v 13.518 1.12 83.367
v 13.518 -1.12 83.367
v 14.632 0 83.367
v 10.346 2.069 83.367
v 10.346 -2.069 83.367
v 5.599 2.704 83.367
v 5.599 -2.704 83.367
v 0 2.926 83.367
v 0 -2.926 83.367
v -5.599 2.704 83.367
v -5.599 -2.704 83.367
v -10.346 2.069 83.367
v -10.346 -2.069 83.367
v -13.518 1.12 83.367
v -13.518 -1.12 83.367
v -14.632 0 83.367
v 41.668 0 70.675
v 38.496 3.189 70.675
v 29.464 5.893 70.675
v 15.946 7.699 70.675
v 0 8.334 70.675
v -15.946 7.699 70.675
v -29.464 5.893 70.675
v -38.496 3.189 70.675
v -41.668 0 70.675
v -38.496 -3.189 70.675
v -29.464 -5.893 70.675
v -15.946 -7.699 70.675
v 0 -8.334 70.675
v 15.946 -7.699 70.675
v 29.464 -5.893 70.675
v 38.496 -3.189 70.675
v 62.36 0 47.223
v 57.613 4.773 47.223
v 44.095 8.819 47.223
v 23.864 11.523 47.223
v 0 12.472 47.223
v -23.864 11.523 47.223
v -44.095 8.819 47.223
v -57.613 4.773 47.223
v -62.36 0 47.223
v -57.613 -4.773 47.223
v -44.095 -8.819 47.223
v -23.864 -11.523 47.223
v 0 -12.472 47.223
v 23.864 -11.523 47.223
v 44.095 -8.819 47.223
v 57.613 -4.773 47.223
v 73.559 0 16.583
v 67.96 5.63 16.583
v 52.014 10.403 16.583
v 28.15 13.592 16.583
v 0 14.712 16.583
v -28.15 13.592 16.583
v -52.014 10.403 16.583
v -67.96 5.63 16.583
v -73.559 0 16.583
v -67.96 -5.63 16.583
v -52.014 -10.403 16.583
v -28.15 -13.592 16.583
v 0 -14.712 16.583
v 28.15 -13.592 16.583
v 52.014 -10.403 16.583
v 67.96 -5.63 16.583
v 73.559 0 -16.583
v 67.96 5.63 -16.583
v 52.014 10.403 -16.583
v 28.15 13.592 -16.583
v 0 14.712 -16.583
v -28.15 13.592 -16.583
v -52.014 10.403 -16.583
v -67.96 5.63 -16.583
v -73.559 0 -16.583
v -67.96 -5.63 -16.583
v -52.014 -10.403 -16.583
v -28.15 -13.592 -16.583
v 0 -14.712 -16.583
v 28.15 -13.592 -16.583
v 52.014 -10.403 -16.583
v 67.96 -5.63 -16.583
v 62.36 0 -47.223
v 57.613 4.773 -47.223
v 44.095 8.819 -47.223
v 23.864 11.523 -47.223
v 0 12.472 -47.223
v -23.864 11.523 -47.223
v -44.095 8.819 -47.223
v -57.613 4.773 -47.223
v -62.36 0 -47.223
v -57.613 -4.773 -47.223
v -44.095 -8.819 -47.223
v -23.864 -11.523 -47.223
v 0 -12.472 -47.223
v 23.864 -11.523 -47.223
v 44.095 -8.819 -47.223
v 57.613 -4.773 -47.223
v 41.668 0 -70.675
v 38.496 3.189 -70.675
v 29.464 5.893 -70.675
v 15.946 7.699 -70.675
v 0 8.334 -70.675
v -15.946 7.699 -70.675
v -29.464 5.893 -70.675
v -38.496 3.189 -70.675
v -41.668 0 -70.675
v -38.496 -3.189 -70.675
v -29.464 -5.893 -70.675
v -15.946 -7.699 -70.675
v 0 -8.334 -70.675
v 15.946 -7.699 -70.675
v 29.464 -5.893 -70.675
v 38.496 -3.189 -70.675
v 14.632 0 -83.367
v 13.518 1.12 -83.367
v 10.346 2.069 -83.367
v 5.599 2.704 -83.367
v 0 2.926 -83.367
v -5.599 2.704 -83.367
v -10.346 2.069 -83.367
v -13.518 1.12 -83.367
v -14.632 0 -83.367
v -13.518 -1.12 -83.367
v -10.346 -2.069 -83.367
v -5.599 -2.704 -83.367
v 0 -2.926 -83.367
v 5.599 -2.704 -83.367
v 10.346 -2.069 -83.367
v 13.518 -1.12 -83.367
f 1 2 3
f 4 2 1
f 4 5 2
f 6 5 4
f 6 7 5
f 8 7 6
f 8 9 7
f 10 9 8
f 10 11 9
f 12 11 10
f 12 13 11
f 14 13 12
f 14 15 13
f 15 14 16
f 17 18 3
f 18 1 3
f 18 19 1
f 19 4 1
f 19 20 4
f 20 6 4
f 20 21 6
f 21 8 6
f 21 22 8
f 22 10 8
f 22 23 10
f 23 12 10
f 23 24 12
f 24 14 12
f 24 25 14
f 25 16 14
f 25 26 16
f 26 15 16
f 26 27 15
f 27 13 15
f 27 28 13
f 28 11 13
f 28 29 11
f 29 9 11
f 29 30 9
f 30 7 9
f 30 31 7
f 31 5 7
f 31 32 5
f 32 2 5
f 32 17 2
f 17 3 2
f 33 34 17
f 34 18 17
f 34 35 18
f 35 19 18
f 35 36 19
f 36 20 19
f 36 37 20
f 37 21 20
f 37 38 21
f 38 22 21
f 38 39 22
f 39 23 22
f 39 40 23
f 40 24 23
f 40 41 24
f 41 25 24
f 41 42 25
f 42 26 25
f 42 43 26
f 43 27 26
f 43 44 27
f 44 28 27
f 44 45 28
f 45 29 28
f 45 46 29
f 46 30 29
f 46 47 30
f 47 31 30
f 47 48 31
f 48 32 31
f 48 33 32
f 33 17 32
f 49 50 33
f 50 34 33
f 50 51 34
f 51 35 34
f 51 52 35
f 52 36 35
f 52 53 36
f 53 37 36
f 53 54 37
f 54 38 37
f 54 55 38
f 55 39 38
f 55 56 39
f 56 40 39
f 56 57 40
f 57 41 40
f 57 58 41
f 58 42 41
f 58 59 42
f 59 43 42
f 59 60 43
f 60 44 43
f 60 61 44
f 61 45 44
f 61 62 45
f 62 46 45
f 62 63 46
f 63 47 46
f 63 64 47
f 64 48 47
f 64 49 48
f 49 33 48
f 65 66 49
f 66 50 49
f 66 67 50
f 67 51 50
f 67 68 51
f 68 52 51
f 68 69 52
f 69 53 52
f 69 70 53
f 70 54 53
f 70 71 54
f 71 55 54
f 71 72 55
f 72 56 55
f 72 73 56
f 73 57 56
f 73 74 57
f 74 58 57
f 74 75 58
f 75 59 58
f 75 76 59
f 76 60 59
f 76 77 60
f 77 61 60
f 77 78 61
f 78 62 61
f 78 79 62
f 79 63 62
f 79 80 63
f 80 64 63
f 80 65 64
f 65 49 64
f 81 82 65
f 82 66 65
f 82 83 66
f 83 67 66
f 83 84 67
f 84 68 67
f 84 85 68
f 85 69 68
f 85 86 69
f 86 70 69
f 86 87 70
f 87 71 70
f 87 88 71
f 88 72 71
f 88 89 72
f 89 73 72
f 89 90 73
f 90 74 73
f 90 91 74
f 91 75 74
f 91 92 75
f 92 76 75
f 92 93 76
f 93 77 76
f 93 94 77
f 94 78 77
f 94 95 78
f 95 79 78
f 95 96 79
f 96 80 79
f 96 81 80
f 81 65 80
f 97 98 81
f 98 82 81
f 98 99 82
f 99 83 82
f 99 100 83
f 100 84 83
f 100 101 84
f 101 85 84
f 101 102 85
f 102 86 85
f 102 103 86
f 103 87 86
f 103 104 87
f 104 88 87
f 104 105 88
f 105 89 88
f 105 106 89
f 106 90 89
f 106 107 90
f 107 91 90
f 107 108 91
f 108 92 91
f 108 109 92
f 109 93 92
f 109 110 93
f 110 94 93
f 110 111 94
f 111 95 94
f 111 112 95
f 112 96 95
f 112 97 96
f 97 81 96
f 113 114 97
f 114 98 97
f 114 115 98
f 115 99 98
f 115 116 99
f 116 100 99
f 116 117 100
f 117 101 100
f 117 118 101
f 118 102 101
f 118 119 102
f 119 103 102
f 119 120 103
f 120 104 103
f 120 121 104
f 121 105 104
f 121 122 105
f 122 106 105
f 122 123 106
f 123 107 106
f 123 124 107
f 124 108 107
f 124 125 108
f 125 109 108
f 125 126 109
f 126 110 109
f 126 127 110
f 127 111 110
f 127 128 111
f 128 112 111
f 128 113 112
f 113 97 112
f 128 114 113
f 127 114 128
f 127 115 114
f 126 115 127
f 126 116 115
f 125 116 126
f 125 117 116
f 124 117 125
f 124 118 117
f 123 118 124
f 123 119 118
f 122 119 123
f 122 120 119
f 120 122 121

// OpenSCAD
// Generated by SolidPython 1.0.1 on 2020-07-29 00:46:51


scale(v = [15, 3, 17]) {
	sphere(r = 5);
}
/***********************************************
*********      SolidPython code:      **********
************************************************
 
# import packages: SolidPython
from solid import *
from solid.utils import *
from itertools import chain, combinations, permutations


class Resize:

    def __init__(self, scad_file):
        self.scad_file = scad_file
        #self.scad_file = import_scad(scad_file)
        # cone/cylinder param:
        self.r1 = 0
        self.r2 = 0
        self.h = 0
        # rectangular prism param:
        self.w = 0
        self.l = 0
        # ellipse param:
        self.r = 0

    # import OpenScad code (file name corresponds to shape)


    # classify shape + parameters
    def assign(self, param1, param2, param3):
        if self.scad_file == 'cone.scad':
            self.r1 = param1
            self.r2 = param2
            self.h = param3
        elif self.scad_file == 'cylinder.scad':
            self.r1 = param1
            self.r2 = param2
            self.h = param3
        elif self.scad_file == 'rectangularPrism.scad':
            self.h = param1
            self.l = param2
            self.w = param3
        else:
            self.r = param1
            self.h = param2

    # resize parameters
    def iterate(self):
        x = range(3, 20, 2)
        i = 1
        if self.scad_file == 'cone.scad':
            tempList = list(permutations(x, 2))
            for temp in tempList:
                param1 = temp[0]
                param2 = temp[1]
                filepath = 'produced_scad_files/' + 'cone' + str(param1) + '_' + str(param2) + '_' + '.scad'
                scad_render_to_file(cylinder(h=param1, r1=param2, r2=0), filepath)

        elif self.scad_file == 'cylinder.scad':
            tempList = list(permutations(x, 3))
            for temp in tempList:
                param1 = temp[0]
                param2 = temp[1]
                filepath = 'produced_scad_files/' + 'cylinder' + str(param1) + '_' + str(param2) + '_' + '.scad'
                scad_render_to_file(cylinder(h=param1, r1=param2, r2=param2), filepath)

        elif self.scad_file == 'rectangularPrism.scad':
            tempList = list(permutations(x, 3))
            for temp in tempList:
                param1 = temp[0]
                param2 = temp[1]
                param3 = temp[2]
                filepath = 'produced_scad_files/' + 'rectangularPrism' + str(param1) + '_' + str(param2) + '_' + str(
                    param3) + '.scad'
                scad_render_to_file(cube(size=(param1, param2, param3)), filepath)

        elif self.scad_file == 'ellipse.scad':
            tempList = list(permutations(x, 4))
            for temp in tempList:
                param1 = temp[0]
                param2 = temp[1]
                param3 = temp[2]
                param4 = temp[3]
                filepath = 'produced_scad_files/' + 'ellipse' + str(param1) + '_' + str(param2) + '_' + str(param3) + '_' + str(param4) + '.scad'
                scad_render_to_file(scale([param1, param2, param3])(sphere(r=param4)), filepath)

    def render_to_scadfile(self):
        scad_render_to_file(scad, 'example.scad') 
 
************************************************/
